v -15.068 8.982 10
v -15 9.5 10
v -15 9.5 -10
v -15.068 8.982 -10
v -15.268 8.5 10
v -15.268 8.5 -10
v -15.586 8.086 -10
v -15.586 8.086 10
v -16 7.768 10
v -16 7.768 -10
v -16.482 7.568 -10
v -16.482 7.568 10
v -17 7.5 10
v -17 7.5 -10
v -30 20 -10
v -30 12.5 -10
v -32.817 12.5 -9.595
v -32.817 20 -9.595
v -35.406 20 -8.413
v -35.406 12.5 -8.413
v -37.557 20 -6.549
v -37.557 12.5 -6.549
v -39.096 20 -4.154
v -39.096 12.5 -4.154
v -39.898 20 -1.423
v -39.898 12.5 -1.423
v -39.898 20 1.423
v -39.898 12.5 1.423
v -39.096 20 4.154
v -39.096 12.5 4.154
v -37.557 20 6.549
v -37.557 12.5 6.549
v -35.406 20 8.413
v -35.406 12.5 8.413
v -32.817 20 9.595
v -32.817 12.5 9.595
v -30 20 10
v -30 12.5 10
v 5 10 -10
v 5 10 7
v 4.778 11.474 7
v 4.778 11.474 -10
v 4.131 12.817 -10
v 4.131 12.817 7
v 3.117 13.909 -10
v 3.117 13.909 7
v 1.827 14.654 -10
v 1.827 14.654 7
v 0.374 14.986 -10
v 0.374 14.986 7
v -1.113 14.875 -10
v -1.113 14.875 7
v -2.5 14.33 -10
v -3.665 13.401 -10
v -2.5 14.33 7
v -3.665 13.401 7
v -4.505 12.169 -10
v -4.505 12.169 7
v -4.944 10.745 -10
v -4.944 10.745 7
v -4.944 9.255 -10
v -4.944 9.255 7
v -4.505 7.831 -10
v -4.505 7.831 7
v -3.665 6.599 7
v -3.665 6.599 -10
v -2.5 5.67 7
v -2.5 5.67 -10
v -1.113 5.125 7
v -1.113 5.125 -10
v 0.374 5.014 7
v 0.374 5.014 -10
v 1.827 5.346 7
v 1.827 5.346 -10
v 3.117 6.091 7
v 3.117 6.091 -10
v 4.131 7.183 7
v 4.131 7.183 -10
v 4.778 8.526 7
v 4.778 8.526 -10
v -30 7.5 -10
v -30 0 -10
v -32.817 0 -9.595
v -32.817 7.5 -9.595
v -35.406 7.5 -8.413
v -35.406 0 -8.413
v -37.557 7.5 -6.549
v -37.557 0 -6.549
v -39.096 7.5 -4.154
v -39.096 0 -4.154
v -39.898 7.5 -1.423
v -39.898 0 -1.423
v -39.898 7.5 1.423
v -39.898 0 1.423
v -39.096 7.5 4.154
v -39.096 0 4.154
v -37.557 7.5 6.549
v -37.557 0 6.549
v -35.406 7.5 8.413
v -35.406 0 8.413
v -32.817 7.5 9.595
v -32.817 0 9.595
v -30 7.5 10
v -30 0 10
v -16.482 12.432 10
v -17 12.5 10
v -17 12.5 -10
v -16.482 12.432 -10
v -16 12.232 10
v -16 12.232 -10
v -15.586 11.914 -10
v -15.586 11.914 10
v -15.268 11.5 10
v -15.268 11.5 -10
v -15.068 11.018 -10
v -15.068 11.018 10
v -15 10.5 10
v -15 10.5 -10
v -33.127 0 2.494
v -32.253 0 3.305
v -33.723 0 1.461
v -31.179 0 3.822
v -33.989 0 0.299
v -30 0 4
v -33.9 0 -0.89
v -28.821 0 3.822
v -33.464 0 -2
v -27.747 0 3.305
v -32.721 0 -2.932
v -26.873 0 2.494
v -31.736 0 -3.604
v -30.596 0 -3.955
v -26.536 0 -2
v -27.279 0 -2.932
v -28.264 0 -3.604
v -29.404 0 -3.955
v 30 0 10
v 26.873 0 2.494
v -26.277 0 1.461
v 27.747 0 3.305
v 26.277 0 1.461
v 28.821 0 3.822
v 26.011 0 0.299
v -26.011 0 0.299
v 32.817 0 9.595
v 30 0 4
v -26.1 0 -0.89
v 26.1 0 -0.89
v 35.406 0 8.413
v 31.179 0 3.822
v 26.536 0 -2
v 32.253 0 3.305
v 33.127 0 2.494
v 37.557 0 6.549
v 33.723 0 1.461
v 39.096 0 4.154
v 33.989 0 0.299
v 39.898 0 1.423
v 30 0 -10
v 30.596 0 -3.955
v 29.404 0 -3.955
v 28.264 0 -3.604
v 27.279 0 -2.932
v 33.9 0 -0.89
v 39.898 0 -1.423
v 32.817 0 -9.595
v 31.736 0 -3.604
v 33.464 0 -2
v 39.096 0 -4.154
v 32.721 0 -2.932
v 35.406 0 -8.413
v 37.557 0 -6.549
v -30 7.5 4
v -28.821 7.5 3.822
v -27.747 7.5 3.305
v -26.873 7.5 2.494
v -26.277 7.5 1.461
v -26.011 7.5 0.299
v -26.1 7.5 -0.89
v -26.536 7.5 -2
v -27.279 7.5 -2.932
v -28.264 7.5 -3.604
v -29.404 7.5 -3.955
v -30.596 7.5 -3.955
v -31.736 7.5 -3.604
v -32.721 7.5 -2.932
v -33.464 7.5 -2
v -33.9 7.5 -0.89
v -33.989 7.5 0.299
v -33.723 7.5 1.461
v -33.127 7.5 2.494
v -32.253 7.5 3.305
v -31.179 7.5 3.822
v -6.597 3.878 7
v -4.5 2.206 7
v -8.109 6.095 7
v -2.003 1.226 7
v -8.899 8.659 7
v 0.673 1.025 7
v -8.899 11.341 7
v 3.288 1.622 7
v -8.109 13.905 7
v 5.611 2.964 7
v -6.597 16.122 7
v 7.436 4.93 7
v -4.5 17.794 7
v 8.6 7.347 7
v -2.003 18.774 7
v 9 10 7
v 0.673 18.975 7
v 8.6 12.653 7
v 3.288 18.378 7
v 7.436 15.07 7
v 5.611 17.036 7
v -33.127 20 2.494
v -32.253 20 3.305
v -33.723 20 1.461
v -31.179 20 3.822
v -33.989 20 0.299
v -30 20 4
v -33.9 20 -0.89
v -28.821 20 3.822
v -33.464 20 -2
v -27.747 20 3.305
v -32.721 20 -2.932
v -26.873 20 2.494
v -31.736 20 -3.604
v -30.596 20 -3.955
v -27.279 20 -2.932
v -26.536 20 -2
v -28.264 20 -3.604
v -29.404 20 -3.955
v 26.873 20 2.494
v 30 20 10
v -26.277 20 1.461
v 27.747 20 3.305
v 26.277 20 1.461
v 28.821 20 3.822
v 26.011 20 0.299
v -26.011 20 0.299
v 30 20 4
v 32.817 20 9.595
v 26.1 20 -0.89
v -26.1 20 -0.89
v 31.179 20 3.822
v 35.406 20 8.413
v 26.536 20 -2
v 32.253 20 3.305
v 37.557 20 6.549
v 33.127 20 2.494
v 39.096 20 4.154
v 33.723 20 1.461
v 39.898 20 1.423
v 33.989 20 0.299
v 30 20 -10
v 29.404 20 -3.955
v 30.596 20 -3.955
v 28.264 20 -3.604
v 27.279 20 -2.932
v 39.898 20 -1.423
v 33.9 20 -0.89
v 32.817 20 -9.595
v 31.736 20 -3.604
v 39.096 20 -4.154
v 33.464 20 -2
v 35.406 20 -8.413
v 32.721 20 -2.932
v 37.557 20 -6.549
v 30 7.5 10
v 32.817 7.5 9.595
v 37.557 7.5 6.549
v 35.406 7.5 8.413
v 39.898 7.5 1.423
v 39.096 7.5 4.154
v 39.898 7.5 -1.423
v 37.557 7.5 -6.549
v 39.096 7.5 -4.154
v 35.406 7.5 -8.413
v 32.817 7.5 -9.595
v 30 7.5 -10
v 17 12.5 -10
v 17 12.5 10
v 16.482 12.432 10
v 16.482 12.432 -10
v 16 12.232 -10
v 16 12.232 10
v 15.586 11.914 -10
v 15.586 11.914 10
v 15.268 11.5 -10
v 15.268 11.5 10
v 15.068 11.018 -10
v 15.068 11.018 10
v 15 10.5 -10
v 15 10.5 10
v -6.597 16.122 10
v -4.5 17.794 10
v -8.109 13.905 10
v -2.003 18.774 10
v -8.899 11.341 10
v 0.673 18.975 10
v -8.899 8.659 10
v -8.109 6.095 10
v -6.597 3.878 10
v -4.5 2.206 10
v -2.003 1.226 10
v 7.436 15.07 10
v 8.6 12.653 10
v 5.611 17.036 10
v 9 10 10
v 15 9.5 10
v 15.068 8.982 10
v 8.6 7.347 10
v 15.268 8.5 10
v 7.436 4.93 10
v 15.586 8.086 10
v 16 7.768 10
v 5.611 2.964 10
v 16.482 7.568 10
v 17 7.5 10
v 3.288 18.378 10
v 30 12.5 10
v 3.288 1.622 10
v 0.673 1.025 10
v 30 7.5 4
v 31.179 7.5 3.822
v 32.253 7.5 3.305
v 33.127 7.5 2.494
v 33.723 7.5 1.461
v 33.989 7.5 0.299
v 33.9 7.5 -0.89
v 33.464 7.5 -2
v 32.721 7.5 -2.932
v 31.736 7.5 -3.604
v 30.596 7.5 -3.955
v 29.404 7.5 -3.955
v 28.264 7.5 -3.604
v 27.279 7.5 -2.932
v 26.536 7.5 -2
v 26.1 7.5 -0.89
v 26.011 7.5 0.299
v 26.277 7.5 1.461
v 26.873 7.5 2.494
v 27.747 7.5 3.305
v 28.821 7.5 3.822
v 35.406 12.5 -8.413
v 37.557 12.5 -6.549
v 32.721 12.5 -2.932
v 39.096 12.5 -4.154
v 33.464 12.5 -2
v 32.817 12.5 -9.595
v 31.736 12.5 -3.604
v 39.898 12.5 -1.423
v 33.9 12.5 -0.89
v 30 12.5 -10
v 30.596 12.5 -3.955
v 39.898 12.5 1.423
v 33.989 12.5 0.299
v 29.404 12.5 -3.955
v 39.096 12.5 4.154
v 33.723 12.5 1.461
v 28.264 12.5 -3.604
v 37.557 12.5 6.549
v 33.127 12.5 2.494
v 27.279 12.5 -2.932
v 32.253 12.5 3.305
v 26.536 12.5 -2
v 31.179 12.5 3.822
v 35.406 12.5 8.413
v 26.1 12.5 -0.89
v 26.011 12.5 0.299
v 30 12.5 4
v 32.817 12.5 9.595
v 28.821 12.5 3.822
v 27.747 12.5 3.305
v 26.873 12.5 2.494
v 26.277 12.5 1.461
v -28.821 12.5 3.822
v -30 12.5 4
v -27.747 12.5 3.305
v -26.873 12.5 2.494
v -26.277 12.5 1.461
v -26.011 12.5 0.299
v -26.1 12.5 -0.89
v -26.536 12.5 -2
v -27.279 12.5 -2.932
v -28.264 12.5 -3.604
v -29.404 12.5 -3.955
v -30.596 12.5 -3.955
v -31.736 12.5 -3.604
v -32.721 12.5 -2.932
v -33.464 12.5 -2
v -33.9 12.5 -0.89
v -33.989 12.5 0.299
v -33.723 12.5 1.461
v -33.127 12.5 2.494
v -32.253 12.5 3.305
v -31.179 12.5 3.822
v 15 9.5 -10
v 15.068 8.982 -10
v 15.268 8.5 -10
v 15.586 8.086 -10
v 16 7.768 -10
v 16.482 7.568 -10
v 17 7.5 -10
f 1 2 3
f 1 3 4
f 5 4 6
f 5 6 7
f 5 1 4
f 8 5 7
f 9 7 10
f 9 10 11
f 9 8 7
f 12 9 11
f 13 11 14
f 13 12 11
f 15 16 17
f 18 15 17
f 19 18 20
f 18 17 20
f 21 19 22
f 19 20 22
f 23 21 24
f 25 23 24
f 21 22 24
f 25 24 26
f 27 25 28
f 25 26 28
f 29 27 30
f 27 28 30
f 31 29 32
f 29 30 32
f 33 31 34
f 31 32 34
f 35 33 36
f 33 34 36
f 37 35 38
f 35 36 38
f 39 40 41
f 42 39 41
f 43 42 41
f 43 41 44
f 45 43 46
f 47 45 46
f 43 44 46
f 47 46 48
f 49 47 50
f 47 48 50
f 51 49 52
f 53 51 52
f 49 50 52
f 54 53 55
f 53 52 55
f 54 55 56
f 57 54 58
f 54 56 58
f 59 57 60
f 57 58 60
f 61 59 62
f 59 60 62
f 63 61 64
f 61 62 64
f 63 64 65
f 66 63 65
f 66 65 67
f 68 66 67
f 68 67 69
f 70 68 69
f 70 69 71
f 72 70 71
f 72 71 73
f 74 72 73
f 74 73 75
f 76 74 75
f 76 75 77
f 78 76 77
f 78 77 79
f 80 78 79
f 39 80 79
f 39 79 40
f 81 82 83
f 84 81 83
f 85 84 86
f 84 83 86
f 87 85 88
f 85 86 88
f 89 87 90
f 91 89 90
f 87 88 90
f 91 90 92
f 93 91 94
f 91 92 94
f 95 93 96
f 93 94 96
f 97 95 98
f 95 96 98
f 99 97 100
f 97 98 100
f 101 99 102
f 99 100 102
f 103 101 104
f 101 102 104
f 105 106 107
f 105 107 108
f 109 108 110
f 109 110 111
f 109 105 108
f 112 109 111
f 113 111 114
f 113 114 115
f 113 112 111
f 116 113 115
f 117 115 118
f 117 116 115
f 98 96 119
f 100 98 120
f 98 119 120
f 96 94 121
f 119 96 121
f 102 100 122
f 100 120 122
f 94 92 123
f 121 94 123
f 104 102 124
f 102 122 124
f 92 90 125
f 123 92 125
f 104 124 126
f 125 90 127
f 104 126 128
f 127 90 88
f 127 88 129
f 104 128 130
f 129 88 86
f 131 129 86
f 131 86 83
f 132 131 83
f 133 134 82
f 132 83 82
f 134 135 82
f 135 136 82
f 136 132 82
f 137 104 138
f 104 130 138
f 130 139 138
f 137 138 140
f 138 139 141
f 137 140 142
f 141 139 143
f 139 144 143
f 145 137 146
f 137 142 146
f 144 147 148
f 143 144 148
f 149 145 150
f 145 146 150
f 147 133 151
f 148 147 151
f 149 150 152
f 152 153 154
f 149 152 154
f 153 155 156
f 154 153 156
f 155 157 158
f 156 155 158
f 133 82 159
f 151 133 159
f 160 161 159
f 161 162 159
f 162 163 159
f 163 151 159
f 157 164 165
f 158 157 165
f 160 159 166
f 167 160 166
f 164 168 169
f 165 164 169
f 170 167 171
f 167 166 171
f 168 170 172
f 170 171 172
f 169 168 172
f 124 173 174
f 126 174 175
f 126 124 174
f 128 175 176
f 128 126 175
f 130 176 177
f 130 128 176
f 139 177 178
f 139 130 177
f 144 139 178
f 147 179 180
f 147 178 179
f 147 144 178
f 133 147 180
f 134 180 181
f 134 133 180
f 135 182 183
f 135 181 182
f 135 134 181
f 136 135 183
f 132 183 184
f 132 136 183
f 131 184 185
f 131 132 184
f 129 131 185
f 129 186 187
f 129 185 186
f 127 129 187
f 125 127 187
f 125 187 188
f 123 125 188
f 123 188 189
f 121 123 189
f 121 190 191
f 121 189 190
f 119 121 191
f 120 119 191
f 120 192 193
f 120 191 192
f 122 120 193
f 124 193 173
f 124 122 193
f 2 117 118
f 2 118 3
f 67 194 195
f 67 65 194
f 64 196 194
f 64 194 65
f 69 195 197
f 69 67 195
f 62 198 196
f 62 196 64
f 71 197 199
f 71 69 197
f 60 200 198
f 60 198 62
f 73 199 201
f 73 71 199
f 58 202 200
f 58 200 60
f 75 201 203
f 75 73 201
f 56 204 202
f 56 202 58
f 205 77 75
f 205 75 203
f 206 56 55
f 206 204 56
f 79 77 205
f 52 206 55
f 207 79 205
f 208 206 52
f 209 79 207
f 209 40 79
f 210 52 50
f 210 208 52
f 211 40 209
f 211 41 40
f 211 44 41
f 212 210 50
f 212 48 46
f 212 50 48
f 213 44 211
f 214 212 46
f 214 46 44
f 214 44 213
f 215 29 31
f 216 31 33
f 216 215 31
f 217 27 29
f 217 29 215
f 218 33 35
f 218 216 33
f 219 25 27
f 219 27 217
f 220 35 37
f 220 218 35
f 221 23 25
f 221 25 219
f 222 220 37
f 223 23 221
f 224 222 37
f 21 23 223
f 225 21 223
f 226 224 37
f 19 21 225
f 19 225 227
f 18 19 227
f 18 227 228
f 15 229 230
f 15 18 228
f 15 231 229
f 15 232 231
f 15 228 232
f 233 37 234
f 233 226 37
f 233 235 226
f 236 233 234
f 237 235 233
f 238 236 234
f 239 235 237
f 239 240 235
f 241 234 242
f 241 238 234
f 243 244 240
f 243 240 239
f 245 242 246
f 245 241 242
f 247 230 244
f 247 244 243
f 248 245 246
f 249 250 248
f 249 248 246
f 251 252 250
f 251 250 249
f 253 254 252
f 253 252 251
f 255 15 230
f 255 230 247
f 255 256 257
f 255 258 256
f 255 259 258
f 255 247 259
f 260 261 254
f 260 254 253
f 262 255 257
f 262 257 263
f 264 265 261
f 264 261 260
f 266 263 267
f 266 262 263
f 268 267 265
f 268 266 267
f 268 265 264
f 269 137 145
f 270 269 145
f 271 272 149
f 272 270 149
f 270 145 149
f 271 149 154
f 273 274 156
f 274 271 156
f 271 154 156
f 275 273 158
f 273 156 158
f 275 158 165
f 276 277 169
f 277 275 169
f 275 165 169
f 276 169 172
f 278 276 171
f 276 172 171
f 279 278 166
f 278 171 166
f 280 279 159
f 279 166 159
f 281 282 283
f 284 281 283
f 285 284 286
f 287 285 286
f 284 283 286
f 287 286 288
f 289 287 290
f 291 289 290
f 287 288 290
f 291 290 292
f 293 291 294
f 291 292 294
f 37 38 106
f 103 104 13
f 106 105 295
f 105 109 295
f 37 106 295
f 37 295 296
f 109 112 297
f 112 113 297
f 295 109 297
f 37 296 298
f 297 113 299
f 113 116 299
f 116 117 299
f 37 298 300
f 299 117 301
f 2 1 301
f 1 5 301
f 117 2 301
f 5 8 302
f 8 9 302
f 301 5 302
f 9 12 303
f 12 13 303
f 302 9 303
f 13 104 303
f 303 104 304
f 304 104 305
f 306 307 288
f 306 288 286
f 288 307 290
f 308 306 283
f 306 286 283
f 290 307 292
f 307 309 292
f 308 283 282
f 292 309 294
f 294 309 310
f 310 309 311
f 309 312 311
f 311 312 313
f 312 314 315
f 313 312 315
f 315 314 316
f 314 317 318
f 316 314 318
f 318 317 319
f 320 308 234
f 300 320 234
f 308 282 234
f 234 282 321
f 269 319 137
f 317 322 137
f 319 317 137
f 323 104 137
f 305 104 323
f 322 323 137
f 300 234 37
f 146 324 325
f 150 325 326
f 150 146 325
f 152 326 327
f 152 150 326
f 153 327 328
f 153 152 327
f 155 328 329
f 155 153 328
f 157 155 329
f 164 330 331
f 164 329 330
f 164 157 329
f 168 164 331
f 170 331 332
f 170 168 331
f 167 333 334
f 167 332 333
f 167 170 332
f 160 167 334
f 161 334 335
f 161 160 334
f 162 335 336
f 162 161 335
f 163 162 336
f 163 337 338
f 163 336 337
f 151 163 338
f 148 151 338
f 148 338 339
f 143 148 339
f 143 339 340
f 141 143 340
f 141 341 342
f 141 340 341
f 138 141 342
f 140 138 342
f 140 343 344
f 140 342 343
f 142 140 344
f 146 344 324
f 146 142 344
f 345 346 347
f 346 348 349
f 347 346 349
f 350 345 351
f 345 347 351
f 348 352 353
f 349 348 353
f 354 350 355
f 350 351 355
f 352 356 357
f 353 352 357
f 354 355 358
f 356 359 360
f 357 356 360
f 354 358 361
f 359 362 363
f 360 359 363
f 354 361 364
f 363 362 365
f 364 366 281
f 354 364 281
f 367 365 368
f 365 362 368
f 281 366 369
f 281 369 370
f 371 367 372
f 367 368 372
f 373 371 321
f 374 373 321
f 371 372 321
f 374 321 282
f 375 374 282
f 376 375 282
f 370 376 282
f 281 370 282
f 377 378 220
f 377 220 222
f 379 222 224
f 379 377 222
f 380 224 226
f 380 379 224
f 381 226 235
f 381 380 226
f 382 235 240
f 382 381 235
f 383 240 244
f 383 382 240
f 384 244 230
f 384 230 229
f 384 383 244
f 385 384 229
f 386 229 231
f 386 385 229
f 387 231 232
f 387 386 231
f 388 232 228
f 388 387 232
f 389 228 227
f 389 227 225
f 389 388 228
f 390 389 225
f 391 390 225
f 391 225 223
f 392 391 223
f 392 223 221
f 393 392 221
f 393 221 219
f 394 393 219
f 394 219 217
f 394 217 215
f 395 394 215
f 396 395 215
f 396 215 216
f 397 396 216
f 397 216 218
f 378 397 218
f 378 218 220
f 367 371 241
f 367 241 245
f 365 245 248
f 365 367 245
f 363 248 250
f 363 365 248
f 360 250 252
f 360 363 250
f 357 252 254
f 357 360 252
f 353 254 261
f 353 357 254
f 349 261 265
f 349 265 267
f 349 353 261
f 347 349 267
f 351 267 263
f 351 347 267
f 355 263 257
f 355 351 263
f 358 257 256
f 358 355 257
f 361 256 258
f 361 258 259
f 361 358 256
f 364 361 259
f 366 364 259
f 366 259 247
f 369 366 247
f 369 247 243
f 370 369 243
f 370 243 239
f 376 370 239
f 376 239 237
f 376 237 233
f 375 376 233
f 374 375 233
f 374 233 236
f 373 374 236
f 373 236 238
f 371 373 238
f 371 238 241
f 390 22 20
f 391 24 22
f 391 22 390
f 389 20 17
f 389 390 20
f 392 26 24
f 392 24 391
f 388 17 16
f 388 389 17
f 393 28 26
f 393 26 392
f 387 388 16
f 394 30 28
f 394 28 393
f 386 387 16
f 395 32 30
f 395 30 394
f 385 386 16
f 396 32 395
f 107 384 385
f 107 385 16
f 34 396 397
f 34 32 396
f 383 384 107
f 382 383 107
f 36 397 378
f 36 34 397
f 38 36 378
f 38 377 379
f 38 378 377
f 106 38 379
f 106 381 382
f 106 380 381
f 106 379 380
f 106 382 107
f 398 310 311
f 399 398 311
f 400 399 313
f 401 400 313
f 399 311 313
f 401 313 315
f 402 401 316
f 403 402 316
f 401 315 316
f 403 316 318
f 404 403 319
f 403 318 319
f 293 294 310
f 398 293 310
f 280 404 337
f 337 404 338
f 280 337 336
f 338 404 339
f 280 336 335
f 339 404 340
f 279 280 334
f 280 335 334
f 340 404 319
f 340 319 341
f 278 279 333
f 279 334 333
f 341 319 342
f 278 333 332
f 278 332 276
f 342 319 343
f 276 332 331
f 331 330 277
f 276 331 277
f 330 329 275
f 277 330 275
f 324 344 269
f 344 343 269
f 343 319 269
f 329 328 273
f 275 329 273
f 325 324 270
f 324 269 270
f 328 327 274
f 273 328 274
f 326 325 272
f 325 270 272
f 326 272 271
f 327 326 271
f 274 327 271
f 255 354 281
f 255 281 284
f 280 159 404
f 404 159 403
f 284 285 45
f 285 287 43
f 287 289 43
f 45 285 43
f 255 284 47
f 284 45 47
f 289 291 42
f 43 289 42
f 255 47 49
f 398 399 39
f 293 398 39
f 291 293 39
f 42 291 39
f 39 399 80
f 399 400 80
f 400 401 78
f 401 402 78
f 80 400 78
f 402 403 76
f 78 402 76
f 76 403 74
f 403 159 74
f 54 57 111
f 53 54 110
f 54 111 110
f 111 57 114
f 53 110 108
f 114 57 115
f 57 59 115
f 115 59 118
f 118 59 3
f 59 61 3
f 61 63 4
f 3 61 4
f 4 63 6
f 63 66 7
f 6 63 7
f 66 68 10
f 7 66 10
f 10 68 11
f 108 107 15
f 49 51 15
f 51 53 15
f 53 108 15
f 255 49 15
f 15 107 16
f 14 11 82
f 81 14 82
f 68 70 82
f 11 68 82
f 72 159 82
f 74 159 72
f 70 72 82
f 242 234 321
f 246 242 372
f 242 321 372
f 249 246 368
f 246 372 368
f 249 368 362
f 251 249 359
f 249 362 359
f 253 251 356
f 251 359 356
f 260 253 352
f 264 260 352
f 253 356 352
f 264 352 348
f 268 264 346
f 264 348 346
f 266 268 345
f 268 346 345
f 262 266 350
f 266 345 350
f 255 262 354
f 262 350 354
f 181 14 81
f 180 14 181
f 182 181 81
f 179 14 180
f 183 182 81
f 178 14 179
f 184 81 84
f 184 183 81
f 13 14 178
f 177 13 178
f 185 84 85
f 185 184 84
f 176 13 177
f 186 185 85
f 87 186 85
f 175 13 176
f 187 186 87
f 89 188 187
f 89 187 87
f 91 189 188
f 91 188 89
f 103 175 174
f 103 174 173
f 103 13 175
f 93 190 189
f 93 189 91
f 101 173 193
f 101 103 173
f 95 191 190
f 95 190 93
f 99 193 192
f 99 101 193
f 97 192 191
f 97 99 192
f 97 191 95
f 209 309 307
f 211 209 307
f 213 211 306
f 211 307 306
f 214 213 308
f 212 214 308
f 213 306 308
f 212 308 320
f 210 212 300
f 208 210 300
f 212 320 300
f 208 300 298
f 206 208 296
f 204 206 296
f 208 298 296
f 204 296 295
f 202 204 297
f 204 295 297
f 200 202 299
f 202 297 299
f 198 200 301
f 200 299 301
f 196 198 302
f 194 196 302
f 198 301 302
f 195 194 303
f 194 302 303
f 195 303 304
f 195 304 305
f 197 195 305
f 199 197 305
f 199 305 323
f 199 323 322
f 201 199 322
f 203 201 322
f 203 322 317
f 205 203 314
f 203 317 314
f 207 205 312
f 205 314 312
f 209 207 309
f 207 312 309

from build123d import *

# Parameters (mm, degrees)
SKETCH1_R           = 4
BOSS_EXTRUDE1_DEPTH = 20
CUT_EXTRUDE1_DEPTH  = 20
SKETCH3_R           = 5
CUT_EXTRUDE2_DEPTH  = 20
SKETCH3_3_R         = 9
CUT_EXTRUDE3_DEPTH  = 3


with BuildPart() as part:
    # Sketch1 → Boss-Extrude1 (new body)
    with BuildSketch(Plane(origin=(0, 0, 0), x_dir=(1, 0, 0), z_dir=(0, 1, 0))):
        with BuildLine():
            Line((-30, -10), (30, -10))
            ThreePointArc((30, -10), (40, 0), (30, 10))
            Line((30, 10), (-30, 10))
            ThreePointArc((-30, 10), (-40, 0), (-30, -10))
        make_face()
        with Locations((-30, 0)):
            Circle(SKETCH1_R, mode=Mode.SUBTRACT)
        with Locations((30, 0)):
            Circle(SKETCH1_R, mode=Mode.SUBTRACT)
    extrude(amount=BOSS_EXTRUDE1_DEPTH)

    # Sketch2 → Cut-Extrude1 (cut)
    with BuildSketch(Plane.XY.offset(10)):
        with BuildLine():
            Line((-40, 12.5), (-17, 12.5))
            ThreePointArc((-17, 12.5), (-15.585786438, 11.914213562), (-15, 10.5))
            Line((-15, 10.5), (-15, 9.5))
            ThreePointArc((-15, 9.5), (-15.585786438, 8.085786438), (-17, 7.5))
            Line((-17, 7.5), (-40, 7.5))
            Line((-40, 7.5), (-40, 12.5))
        make_face()
        with BuildLine():
            Line((40, 7.5), (40, 12.5))
            Line((40, 12.5), (17, 12.5))
            ThreePointArc((17, 12.5), (15.585786438, 11.914213562), (15, 10.5))
            Line((15, 10.5), (15, 9.5))
            ThreePointArc((15, 9.5), (15.585786438, 8.085786438), (17, 7.5))
            Line((17, 7.5), (40, 7.5))
        make_face()
    extrude(amount=-CUT_EXTRUDE1_DEPTH, mode=Mode.SUBTRACT)

    # Sketch3 → Cut-Extrude2 (cut)
    with BuildSketch(Plane.XY.offset(10)):
        with Locations((0, 10)):
            Circle(SKETCH3_R)
    extrude(amount=-CUT_EXTRUDE2_DEPTH, mode=Mode.SUBTRACT)

    # Sketch3<3> → Cut-Extrude3 (cut)
    with BuildSketch(Plane.XY.offset(10)):
        with Locations((0, 10)):
            Circle(SKETCH3_3_R)
    extrude(amount=-CUT_EXTRUDE3_DEPTH, mode=Mode.SUBTRACT)


solid = part.part
